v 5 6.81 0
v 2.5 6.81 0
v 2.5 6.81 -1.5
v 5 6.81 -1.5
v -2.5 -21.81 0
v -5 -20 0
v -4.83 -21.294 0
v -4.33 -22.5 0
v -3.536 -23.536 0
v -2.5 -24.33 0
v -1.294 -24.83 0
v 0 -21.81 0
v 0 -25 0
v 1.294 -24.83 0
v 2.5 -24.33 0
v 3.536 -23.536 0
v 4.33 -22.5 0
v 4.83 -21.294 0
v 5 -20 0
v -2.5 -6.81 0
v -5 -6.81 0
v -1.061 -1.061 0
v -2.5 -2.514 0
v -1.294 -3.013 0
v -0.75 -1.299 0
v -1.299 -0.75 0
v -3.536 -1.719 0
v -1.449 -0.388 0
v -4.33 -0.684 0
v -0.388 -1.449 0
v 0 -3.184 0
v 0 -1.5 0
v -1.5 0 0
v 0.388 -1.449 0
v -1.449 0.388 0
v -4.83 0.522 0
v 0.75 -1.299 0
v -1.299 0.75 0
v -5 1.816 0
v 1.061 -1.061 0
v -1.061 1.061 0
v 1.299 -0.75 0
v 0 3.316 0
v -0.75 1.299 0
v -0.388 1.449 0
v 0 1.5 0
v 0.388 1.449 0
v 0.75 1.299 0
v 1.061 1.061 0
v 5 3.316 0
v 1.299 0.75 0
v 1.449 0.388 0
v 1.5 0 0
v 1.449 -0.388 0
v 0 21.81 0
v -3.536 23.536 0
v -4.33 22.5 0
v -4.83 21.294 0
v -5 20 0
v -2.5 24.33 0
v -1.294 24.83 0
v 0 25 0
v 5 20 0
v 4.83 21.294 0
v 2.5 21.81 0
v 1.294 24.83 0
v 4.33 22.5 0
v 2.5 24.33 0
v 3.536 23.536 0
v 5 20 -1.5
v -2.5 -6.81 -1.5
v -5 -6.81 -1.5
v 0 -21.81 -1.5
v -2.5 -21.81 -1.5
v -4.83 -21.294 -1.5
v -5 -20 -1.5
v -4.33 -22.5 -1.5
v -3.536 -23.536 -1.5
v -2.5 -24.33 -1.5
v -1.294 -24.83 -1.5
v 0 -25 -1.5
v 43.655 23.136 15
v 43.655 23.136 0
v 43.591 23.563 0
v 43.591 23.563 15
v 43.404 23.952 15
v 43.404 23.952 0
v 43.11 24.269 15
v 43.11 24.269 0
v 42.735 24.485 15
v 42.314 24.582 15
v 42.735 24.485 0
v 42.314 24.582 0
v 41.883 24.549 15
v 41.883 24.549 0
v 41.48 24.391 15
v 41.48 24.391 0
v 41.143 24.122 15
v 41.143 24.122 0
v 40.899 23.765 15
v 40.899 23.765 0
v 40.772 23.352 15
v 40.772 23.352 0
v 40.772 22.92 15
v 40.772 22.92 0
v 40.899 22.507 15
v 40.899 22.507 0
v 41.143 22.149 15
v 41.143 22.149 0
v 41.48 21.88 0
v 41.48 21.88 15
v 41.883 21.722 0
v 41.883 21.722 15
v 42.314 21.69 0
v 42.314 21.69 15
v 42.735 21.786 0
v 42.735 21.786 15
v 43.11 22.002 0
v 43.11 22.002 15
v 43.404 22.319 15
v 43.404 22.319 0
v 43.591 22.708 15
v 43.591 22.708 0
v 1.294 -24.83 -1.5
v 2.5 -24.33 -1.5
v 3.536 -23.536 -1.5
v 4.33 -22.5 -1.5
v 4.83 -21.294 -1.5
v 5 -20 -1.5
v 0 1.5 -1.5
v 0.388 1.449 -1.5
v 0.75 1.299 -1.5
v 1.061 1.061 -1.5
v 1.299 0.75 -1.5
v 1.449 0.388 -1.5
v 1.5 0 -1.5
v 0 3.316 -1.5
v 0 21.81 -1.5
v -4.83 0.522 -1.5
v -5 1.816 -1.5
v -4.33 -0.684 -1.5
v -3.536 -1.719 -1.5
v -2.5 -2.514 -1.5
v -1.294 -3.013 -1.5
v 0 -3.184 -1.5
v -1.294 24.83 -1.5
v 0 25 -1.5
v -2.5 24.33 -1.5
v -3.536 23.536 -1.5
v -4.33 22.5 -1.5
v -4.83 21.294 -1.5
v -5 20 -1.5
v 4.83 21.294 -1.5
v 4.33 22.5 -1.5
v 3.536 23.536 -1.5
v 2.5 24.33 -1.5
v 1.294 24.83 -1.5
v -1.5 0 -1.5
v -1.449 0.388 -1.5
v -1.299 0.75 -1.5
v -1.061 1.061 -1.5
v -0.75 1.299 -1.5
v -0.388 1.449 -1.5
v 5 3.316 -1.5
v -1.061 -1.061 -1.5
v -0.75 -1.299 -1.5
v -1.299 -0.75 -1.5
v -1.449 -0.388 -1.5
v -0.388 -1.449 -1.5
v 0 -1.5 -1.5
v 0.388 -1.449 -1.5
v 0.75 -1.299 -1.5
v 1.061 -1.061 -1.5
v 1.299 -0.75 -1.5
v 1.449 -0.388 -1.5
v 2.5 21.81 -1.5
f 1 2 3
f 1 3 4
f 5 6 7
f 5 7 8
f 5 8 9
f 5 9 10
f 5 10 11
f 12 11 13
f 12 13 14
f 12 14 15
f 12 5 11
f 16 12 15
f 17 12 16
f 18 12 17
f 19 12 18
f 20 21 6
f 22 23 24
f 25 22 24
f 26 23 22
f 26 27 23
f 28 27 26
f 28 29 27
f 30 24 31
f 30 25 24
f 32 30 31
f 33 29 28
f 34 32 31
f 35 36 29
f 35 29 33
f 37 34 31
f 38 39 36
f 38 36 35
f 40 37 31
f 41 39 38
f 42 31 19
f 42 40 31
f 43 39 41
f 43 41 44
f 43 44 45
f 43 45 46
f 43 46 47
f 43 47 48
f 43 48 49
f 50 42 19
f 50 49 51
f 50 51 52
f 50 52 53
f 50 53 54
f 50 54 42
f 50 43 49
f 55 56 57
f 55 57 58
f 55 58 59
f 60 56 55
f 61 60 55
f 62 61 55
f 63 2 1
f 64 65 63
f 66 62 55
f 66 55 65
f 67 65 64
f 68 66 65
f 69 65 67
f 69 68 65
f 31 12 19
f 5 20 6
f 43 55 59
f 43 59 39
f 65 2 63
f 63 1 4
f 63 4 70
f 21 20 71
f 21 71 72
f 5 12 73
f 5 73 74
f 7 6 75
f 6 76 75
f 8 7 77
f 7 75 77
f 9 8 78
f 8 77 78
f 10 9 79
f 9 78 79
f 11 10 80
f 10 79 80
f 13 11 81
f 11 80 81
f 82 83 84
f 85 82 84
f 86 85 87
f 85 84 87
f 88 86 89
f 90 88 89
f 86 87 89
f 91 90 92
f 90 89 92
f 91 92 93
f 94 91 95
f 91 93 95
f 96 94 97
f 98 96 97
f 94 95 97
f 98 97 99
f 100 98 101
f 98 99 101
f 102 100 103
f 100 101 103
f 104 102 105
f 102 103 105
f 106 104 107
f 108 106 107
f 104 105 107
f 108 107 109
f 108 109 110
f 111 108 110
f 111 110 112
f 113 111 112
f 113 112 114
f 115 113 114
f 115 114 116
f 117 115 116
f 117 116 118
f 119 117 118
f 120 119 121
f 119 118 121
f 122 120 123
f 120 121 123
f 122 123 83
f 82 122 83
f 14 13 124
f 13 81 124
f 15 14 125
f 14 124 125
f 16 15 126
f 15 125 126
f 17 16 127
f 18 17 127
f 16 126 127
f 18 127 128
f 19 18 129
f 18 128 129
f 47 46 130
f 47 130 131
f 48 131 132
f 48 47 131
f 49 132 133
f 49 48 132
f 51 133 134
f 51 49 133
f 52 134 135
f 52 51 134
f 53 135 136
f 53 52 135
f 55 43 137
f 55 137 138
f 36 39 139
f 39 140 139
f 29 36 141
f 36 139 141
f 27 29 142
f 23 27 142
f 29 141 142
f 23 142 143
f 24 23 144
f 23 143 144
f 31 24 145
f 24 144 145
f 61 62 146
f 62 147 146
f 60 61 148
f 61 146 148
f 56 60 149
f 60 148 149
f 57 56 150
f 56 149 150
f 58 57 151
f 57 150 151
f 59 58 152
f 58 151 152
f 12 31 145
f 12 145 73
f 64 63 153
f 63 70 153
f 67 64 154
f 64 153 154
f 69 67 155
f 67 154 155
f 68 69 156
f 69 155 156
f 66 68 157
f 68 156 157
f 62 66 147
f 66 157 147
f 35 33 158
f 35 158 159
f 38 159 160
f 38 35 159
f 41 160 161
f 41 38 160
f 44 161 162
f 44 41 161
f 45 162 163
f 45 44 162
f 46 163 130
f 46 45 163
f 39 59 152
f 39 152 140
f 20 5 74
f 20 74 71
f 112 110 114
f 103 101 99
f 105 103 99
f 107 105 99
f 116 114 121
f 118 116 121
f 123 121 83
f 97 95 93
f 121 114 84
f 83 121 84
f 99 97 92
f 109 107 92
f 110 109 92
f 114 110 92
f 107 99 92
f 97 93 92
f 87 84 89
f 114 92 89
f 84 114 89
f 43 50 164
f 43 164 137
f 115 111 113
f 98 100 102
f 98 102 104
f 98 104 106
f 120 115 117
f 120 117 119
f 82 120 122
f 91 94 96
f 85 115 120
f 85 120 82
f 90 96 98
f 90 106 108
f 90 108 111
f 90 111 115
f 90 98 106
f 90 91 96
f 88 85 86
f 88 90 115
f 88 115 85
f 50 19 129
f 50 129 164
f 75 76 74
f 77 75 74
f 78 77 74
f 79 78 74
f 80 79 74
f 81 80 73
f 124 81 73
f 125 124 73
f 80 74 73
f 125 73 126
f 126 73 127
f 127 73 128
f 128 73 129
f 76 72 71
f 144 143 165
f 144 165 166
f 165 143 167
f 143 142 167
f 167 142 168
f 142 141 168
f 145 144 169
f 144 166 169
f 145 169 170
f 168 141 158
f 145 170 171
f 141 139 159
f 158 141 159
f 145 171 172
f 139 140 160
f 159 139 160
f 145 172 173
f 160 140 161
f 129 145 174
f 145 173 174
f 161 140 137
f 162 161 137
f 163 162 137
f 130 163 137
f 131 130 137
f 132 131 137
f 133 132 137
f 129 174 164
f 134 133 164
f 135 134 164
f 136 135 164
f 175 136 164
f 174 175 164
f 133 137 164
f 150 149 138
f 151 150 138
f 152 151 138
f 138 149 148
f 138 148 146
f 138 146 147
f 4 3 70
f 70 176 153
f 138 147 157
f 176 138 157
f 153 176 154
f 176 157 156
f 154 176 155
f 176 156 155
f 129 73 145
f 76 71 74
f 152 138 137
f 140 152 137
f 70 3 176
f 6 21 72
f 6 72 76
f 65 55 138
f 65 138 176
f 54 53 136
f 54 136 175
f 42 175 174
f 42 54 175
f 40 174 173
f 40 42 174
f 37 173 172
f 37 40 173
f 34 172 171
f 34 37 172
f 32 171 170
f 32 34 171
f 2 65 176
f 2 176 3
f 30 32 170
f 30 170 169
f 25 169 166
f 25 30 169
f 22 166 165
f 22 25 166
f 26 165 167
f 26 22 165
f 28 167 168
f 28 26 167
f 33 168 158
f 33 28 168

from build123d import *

# Parameters (mm, degrees)
F1_DEPTH = 1.5
F2_R     = 4.99999
F0_R     = 1.45
F3_DEPTH = 15


# Not quite as in the source:
# - a fillet or chamfer is up to 0.001 mm smaller than in the source, because OpenCascade refuses the exact size


with BuildPart() as f1:
    # F0 (on Top) → F1 (new body)
    with BuildSketch(Plane.XY):
        Polygon((2.5, 6.8097828329), (5, 6.8097828329), (5, 25), (-5, 25), (-5, 3.3164751772), (0, 3.3164751772), (0, 21.8097828329), (2.5, 21.8097828329), align=None)
        Polygon((-5, -25), (5, -25), (5, -3.1835248228), (0, -3.1835248228), (0, -21.8097828329), (-2.5, -21.8097828329), (-2.5, -6.8097828329), (-5, -6.8097828329), align=None)
        with BuildLine():
            Line((1.5, 0), (5, 0))
            Line((5, 0), (5, 3.3164751772))
            Line((5, 3.3164751772), (0, 3.3164751772))
            Line((0, 3.3164751772), (0, 1.5))
            ThreePointArc((0, 1.5), (1.0606601718, 1.0606601718), (1.5, 0))
        make_face()
        with BuildLine():
            Line((-5, 3.3164751772), (-5, 0))
            Line((-5, 0), (-1.5, 0))
            ThreePointArc((-1.5, 0), (-1.0606601718, 1.0606601718), (0, 1.5))
            Line((0, 1.5), (0, 3.3164751772))
            Line((0, 3.3164751772), (-5, 3.3164751772))
        make_face()
        with BuildLine():
            Line((-5, -3.1835248228), (0, -3.1835248228))
            Line((0, -3.1835248228), (0, -1.5))
            ThreePointArc((0, -1.5), (-1.0606601718, -1.0606601718), (-1.5, 0))
            Line((-1.5, 0), (-5, 0))
            Line((-5, 0), (-5, -3.1835248228))
        make_face()
        with BuildLine():
            Line((0, -3.1835248228), (5, -3.1835248228))
            Line((5, -3.1835248228), (5, 0))
            Line((5, 0), (1.5, 0))
            ThreePointArc((1.5, 0), (1.0606601718, -1.0606601718), (0, -1.5))
            Line((0, -1.5), (0, -3.1835248228))
        make_face()
    extrude(amount=-F1_DEPTH)

    # F2 (radius 5 in the source; OpenCascade refuses exactly that, so slightly less here)
    f2_edges = [f1.edges().sort_by_distance(p)[0] for p in [
        (5, 25, -0.75),
        (-5, 25, -0.75),
        (-5, -3.183525, -0.75),
        (5, -25, -0.75),
        (-5, -25, -0.75),
    ]]
    fillet(f2_edges, radius=F2_R)


with BuildPart() as f3:
    # F0 (on Top) → F3 (new body)
    with BuildSketch(Plane.XY):
        with Locations((42.2054678202, 23.1356341392)):
            Circle(F0_R)
    extrude(amount=F3_DEPTH)


solid = Compound([f1.part, f3.part])
